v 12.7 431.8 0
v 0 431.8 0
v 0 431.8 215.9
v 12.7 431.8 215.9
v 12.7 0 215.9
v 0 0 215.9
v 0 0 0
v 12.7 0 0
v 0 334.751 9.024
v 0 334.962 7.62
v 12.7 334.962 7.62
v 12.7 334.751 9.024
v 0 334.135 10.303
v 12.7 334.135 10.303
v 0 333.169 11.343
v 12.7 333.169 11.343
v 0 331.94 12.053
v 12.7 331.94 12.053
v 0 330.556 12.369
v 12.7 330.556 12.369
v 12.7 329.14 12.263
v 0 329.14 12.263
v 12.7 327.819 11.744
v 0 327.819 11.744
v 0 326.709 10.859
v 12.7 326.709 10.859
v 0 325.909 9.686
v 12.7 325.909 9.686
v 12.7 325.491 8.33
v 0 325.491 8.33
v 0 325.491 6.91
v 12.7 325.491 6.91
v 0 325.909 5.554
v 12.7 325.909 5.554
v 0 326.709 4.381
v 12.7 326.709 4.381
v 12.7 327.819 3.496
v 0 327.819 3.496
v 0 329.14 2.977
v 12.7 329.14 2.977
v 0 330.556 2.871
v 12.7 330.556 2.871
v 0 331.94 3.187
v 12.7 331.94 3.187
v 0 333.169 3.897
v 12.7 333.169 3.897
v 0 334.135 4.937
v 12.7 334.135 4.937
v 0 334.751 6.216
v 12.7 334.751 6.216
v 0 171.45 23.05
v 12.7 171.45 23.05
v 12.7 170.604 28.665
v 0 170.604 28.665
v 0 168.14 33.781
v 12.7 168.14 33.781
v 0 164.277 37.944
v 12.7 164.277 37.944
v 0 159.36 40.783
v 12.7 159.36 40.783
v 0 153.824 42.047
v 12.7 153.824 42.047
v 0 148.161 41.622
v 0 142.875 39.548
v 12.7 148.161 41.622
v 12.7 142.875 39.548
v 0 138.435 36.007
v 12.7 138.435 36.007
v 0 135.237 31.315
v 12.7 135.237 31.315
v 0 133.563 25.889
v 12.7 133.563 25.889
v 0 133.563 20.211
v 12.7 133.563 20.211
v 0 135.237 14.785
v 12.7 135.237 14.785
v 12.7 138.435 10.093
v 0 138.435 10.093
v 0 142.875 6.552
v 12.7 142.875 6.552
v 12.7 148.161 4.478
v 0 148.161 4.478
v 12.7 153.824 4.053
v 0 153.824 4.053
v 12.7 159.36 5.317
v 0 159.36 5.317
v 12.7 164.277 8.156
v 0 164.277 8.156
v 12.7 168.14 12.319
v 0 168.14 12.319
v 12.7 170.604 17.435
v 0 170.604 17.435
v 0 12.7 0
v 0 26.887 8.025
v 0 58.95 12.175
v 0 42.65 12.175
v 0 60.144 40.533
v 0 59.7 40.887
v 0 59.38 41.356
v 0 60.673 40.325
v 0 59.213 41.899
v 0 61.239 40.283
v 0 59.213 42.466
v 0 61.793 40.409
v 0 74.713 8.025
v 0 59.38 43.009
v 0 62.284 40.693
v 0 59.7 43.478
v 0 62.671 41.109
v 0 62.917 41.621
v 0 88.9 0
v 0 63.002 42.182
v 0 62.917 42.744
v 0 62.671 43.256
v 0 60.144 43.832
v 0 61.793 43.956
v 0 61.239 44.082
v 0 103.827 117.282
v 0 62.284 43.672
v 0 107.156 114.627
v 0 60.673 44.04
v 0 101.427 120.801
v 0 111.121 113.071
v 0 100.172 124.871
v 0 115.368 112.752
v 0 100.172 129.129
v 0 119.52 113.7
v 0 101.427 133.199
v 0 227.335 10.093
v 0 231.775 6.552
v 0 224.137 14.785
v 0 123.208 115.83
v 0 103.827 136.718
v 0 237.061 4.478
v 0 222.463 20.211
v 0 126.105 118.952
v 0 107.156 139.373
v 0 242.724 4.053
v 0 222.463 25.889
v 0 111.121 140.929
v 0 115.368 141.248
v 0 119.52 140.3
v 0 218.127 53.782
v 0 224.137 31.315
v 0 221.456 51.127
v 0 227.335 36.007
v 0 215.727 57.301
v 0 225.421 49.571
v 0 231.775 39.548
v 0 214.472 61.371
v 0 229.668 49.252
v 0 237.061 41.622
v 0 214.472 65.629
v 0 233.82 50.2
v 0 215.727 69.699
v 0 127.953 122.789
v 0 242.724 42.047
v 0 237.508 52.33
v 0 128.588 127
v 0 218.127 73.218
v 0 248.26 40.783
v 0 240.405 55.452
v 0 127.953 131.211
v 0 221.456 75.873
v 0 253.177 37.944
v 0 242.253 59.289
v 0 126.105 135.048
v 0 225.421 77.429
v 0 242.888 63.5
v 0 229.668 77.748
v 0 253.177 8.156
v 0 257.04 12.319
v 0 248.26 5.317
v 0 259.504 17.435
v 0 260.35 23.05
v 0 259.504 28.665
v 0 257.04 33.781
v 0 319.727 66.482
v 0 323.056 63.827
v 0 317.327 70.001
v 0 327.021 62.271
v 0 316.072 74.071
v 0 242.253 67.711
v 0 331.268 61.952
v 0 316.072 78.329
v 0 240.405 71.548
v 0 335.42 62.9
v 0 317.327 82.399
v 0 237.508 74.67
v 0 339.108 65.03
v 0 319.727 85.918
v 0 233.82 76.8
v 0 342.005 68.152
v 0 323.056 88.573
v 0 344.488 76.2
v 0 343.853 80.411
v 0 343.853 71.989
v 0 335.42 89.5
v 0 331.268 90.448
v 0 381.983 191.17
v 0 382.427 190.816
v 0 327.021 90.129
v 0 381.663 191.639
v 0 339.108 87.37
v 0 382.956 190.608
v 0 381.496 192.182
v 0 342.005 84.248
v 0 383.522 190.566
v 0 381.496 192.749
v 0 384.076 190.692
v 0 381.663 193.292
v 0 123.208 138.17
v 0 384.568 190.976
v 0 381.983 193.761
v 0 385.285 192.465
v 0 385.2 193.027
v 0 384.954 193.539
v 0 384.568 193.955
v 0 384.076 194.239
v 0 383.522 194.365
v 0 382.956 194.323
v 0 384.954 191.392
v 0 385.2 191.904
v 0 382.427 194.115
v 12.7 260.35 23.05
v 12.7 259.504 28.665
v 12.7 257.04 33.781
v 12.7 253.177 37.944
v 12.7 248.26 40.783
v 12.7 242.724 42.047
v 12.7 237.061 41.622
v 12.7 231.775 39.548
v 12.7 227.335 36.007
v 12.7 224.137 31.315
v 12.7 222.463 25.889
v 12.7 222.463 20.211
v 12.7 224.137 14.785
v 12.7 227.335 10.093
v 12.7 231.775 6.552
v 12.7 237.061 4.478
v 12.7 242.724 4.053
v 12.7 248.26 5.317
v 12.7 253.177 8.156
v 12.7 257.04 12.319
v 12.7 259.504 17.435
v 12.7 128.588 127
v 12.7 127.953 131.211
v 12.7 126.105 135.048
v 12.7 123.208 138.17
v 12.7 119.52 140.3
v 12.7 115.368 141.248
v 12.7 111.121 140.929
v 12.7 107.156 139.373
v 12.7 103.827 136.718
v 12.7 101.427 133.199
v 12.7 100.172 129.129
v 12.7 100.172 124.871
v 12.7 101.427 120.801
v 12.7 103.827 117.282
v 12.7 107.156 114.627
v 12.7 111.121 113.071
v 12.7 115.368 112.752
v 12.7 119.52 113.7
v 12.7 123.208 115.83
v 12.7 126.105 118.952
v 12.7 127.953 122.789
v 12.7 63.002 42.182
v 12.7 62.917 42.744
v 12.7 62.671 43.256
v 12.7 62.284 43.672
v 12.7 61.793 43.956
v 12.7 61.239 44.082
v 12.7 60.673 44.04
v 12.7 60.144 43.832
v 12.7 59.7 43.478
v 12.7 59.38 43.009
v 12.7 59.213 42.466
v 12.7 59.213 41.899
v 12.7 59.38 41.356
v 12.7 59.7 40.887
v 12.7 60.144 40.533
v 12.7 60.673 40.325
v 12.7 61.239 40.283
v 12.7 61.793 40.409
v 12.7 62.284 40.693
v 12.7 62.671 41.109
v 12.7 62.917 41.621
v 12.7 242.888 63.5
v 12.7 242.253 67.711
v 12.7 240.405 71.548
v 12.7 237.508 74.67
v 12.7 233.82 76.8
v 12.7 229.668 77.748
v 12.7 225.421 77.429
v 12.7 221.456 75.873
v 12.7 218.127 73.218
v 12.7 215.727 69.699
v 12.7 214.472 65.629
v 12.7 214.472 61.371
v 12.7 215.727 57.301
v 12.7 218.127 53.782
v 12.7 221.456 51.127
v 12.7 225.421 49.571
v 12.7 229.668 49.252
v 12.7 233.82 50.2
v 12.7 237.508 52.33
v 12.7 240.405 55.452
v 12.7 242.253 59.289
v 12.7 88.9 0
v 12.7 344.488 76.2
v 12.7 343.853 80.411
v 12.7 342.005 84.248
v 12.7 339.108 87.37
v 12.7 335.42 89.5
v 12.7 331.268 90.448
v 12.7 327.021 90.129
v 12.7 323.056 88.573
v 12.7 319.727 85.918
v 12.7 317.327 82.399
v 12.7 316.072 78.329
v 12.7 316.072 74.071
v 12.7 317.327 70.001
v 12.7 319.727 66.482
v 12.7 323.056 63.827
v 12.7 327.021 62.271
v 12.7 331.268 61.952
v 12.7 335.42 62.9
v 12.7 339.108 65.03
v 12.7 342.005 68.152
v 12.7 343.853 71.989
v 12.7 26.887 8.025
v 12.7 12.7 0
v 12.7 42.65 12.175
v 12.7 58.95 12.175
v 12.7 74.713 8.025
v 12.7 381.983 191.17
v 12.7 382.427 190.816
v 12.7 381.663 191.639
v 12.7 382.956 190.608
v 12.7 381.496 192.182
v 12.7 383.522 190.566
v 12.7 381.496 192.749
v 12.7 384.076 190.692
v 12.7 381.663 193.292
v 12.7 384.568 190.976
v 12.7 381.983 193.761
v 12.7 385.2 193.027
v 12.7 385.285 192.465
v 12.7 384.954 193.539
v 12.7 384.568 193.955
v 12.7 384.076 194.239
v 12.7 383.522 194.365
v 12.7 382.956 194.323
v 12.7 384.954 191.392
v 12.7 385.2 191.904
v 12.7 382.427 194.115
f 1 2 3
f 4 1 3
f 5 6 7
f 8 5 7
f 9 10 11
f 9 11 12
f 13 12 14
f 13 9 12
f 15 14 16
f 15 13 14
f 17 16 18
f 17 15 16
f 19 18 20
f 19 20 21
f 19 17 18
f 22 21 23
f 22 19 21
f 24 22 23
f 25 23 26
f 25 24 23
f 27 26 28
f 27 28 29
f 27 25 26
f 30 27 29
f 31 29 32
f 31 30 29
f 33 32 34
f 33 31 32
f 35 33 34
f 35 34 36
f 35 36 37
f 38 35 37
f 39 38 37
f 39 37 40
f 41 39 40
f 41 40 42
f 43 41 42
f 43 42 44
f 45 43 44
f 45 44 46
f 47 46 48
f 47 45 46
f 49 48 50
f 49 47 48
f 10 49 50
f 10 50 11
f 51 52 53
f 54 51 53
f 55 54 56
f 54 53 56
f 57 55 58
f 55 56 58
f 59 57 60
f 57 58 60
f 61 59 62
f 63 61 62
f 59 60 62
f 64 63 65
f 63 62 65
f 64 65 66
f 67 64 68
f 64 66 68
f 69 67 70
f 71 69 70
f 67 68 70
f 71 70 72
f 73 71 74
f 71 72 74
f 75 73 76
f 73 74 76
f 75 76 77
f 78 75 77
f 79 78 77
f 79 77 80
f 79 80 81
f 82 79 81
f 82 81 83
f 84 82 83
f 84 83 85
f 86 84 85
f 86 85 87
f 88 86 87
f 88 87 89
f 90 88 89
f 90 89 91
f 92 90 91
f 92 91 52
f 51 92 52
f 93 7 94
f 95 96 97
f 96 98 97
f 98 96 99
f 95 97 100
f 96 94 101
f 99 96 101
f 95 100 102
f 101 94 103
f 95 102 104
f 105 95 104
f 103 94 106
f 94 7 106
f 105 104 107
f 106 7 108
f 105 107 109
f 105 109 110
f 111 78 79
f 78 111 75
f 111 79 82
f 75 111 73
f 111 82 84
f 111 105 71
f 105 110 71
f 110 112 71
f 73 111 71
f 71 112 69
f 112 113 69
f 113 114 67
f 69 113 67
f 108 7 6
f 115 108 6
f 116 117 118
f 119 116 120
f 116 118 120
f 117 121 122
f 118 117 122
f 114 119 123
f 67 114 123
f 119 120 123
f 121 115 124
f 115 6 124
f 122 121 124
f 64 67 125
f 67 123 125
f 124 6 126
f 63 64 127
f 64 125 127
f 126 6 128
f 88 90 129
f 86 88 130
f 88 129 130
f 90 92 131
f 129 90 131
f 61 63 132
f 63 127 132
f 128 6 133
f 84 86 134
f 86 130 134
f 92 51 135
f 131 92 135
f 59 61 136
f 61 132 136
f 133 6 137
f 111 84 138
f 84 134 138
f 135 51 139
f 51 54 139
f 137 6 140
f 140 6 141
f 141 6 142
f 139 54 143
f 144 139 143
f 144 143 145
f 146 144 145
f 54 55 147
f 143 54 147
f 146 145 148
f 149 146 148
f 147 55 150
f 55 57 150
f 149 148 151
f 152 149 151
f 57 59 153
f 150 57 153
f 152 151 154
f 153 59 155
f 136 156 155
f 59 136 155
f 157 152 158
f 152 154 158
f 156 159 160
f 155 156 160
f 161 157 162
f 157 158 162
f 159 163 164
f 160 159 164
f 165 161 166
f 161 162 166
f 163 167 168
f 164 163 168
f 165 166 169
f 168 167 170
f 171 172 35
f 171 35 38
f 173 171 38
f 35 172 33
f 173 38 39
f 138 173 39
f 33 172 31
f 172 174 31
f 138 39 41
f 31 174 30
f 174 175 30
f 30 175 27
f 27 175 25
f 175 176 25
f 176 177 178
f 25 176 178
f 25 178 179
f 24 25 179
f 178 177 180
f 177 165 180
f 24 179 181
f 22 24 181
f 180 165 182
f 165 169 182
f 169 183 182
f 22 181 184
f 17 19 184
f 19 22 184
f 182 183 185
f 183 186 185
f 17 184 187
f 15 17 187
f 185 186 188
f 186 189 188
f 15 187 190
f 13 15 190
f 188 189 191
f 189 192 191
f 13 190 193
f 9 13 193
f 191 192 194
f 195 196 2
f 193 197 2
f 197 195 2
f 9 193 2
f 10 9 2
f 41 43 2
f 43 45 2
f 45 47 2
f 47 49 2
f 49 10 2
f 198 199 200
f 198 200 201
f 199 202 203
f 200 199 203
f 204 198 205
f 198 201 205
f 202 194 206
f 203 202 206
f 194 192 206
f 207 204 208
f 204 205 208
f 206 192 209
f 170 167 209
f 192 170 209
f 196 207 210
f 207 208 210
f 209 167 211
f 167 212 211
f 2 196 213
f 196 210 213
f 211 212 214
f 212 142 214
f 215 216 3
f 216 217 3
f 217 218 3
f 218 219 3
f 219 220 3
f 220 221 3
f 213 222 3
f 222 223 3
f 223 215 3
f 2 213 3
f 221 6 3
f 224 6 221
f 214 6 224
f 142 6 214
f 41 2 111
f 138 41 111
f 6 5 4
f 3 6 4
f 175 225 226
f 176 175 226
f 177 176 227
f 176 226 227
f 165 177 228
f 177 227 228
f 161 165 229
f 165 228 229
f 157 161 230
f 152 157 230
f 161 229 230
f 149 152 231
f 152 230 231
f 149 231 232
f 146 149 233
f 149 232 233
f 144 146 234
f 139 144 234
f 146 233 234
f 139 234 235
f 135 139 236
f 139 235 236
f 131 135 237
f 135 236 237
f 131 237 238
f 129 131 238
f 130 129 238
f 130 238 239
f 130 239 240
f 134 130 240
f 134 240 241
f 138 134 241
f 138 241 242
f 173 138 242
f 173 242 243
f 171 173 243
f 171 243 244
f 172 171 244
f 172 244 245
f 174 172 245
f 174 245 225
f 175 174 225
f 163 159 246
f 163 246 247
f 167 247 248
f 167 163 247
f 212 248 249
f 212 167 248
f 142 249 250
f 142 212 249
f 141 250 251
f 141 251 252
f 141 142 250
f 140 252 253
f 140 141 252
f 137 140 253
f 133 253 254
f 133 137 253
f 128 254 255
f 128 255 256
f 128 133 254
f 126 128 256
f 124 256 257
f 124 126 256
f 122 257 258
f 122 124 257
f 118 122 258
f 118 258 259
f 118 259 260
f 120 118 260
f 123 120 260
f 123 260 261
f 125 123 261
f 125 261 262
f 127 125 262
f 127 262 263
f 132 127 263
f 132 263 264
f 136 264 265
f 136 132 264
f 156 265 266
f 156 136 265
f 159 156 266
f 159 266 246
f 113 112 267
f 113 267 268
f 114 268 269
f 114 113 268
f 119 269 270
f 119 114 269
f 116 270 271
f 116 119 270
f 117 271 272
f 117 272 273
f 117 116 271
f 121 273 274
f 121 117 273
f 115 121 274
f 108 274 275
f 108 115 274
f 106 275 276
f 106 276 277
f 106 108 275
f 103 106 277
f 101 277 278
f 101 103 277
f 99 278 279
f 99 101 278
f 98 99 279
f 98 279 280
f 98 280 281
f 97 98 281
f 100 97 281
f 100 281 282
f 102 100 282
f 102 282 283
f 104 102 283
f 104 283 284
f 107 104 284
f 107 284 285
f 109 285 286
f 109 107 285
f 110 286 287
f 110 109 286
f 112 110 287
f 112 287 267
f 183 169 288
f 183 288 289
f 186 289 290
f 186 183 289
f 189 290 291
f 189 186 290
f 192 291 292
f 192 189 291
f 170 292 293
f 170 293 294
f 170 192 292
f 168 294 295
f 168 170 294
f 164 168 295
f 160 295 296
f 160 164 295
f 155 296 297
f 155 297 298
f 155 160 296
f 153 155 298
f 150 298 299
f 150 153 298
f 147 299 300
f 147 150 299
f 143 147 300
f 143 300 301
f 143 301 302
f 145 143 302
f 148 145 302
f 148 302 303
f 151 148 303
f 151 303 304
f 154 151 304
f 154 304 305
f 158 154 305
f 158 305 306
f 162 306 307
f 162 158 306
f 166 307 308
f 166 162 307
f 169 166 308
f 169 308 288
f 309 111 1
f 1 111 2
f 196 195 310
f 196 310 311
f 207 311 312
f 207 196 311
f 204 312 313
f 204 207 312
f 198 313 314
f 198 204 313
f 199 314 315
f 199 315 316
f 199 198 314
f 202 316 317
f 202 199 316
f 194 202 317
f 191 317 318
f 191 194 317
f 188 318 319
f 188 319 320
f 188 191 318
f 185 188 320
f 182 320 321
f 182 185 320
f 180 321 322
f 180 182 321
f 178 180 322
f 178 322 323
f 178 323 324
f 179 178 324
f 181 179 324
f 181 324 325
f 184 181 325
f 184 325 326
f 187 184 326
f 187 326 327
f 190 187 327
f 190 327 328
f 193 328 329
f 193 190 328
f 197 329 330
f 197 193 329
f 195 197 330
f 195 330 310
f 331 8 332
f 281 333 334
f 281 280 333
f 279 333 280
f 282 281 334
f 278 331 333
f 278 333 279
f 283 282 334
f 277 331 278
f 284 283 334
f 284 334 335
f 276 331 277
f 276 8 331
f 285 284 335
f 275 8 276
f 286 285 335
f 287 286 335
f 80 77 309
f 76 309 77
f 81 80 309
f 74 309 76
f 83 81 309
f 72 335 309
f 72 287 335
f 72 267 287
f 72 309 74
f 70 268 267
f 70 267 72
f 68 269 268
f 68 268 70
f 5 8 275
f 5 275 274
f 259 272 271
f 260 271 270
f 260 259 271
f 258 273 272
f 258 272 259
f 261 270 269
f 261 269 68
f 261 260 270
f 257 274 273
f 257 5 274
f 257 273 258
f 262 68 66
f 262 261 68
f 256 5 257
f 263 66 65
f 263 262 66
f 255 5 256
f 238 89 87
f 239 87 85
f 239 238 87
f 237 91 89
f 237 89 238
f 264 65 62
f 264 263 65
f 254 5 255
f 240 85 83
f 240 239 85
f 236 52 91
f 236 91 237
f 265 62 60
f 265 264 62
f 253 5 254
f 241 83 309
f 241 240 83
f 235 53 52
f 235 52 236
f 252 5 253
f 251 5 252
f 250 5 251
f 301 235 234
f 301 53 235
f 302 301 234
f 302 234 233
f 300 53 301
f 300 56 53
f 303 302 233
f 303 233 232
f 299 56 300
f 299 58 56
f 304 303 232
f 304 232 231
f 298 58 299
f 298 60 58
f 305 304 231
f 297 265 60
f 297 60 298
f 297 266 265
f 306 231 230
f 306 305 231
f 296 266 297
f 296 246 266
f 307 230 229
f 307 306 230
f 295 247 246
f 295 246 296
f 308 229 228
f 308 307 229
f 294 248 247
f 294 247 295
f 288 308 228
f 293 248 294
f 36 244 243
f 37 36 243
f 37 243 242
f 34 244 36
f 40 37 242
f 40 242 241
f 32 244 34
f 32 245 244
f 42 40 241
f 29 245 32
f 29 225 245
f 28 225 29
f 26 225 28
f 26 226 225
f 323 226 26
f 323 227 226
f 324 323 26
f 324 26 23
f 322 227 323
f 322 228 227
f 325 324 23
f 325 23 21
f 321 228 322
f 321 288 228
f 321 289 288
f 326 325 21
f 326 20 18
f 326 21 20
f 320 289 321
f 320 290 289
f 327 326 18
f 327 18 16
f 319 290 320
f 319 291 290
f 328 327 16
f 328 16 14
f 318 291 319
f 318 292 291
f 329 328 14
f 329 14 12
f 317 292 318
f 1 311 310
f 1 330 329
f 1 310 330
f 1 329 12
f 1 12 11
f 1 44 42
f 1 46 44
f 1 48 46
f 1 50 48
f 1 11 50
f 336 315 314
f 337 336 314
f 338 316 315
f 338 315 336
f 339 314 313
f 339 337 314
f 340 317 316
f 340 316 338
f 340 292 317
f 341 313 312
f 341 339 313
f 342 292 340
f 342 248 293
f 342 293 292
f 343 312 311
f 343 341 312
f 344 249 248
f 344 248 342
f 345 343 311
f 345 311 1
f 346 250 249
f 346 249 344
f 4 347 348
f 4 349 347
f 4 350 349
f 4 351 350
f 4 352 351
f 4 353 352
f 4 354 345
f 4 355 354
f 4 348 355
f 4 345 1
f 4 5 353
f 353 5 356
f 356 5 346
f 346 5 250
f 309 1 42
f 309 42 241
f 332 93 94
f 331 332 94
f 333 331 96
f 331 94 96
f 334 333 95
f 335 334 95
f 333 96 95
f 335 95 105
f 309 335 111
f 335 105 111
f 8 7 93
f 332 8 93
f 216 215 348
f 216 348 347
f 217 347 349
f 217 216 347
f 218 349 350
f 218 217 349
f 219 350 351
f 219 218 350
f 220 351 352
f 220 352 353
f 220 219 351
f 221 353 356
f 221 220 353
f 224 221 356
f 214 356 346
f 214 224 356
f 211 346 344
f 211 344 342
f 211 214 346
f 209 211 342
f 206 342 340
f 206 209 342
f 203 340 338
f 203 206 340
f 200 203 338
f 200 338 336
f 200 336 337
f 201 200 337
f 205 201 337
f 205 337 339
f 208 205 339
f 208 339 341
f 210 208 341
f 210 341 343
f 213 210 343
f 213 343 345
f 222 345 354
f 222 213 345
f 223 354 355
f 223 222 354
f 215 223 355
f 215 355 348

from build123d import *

# Parameters (mm, degrees)
F0_R     = 1.905
F0_R_2   = 14.2875
F0_R_3   = 4.7625
F1_DEPTH = 12.7
F2_R     = 19.05
F3_DEPTH = 25.4
F4_W     = 431.8
F4_H     = 139.7
F5_DEPTH = 12.7


with BuildPart() as f1:
    # F0 (on Right) → F1 (new body)
    with BuildSketch(Plane.YZ):
        with BuildLine():
            Line((0, 355.6), (0, 0))
            Line((0, 0), (12.7, 0))
            ThreePointArc((12.7, 0), (50.8, 12.7), (88.9, 0))
            Line((88.9, 0), (431.8, 0))
            Line((431.8, 0), (431.8, 355.6))
            Line((431.8, 355.6), (0, 355.6))
        make_face()
        with Locations((61.096733, 42.182442)):
            Circle(F0_R, mode=Mode.SUBTRACT)
        with Locations((228.6, 63.5)):
            Circle(F0_R_2, mode=Mode.SUBTRACT)
        with Locations((330.2, 7.62)):
            Circle(F0_R_3, mode=Mode.SUBTRACT)
        with Locations((330.2, 76.2)):
            Circle(F0_R_2, mode=Mode.SUBTRACT)
        with Locations((114.3, 127)):
            Circle(F0_R_2, mode=Mode.SUBTRACT)
        with Locations((383.379782, 192.465496)):
            Circle(F0_R, mode=Mode.SUBTRACT)
    extrude(amount=F1_DEPTH)

    # F2 (on face) → F3 (cut)
    with BuildSketch(Plane.YZ.offset(12.7)):
        with Locations((152.4, 23.05)):
            Circle(F2_R)
        with Locations((241.3, 23.05)):
            Circle(F2_R)
    extrude(amount=-F3_DEPTH, mode=Mode.SUBTRACT)

    # F4 (on face) → F5 (cut, through all)
    with BuildSketch(Plane.YZ.offset(12.7)):
        with Locations((215.9, 285.75)):
            Rectangle(F4_W, F4_H)
    extrude(amount=-F5_DEPTH, mode=Mode.SUBTRACT)


solid = f1.part
